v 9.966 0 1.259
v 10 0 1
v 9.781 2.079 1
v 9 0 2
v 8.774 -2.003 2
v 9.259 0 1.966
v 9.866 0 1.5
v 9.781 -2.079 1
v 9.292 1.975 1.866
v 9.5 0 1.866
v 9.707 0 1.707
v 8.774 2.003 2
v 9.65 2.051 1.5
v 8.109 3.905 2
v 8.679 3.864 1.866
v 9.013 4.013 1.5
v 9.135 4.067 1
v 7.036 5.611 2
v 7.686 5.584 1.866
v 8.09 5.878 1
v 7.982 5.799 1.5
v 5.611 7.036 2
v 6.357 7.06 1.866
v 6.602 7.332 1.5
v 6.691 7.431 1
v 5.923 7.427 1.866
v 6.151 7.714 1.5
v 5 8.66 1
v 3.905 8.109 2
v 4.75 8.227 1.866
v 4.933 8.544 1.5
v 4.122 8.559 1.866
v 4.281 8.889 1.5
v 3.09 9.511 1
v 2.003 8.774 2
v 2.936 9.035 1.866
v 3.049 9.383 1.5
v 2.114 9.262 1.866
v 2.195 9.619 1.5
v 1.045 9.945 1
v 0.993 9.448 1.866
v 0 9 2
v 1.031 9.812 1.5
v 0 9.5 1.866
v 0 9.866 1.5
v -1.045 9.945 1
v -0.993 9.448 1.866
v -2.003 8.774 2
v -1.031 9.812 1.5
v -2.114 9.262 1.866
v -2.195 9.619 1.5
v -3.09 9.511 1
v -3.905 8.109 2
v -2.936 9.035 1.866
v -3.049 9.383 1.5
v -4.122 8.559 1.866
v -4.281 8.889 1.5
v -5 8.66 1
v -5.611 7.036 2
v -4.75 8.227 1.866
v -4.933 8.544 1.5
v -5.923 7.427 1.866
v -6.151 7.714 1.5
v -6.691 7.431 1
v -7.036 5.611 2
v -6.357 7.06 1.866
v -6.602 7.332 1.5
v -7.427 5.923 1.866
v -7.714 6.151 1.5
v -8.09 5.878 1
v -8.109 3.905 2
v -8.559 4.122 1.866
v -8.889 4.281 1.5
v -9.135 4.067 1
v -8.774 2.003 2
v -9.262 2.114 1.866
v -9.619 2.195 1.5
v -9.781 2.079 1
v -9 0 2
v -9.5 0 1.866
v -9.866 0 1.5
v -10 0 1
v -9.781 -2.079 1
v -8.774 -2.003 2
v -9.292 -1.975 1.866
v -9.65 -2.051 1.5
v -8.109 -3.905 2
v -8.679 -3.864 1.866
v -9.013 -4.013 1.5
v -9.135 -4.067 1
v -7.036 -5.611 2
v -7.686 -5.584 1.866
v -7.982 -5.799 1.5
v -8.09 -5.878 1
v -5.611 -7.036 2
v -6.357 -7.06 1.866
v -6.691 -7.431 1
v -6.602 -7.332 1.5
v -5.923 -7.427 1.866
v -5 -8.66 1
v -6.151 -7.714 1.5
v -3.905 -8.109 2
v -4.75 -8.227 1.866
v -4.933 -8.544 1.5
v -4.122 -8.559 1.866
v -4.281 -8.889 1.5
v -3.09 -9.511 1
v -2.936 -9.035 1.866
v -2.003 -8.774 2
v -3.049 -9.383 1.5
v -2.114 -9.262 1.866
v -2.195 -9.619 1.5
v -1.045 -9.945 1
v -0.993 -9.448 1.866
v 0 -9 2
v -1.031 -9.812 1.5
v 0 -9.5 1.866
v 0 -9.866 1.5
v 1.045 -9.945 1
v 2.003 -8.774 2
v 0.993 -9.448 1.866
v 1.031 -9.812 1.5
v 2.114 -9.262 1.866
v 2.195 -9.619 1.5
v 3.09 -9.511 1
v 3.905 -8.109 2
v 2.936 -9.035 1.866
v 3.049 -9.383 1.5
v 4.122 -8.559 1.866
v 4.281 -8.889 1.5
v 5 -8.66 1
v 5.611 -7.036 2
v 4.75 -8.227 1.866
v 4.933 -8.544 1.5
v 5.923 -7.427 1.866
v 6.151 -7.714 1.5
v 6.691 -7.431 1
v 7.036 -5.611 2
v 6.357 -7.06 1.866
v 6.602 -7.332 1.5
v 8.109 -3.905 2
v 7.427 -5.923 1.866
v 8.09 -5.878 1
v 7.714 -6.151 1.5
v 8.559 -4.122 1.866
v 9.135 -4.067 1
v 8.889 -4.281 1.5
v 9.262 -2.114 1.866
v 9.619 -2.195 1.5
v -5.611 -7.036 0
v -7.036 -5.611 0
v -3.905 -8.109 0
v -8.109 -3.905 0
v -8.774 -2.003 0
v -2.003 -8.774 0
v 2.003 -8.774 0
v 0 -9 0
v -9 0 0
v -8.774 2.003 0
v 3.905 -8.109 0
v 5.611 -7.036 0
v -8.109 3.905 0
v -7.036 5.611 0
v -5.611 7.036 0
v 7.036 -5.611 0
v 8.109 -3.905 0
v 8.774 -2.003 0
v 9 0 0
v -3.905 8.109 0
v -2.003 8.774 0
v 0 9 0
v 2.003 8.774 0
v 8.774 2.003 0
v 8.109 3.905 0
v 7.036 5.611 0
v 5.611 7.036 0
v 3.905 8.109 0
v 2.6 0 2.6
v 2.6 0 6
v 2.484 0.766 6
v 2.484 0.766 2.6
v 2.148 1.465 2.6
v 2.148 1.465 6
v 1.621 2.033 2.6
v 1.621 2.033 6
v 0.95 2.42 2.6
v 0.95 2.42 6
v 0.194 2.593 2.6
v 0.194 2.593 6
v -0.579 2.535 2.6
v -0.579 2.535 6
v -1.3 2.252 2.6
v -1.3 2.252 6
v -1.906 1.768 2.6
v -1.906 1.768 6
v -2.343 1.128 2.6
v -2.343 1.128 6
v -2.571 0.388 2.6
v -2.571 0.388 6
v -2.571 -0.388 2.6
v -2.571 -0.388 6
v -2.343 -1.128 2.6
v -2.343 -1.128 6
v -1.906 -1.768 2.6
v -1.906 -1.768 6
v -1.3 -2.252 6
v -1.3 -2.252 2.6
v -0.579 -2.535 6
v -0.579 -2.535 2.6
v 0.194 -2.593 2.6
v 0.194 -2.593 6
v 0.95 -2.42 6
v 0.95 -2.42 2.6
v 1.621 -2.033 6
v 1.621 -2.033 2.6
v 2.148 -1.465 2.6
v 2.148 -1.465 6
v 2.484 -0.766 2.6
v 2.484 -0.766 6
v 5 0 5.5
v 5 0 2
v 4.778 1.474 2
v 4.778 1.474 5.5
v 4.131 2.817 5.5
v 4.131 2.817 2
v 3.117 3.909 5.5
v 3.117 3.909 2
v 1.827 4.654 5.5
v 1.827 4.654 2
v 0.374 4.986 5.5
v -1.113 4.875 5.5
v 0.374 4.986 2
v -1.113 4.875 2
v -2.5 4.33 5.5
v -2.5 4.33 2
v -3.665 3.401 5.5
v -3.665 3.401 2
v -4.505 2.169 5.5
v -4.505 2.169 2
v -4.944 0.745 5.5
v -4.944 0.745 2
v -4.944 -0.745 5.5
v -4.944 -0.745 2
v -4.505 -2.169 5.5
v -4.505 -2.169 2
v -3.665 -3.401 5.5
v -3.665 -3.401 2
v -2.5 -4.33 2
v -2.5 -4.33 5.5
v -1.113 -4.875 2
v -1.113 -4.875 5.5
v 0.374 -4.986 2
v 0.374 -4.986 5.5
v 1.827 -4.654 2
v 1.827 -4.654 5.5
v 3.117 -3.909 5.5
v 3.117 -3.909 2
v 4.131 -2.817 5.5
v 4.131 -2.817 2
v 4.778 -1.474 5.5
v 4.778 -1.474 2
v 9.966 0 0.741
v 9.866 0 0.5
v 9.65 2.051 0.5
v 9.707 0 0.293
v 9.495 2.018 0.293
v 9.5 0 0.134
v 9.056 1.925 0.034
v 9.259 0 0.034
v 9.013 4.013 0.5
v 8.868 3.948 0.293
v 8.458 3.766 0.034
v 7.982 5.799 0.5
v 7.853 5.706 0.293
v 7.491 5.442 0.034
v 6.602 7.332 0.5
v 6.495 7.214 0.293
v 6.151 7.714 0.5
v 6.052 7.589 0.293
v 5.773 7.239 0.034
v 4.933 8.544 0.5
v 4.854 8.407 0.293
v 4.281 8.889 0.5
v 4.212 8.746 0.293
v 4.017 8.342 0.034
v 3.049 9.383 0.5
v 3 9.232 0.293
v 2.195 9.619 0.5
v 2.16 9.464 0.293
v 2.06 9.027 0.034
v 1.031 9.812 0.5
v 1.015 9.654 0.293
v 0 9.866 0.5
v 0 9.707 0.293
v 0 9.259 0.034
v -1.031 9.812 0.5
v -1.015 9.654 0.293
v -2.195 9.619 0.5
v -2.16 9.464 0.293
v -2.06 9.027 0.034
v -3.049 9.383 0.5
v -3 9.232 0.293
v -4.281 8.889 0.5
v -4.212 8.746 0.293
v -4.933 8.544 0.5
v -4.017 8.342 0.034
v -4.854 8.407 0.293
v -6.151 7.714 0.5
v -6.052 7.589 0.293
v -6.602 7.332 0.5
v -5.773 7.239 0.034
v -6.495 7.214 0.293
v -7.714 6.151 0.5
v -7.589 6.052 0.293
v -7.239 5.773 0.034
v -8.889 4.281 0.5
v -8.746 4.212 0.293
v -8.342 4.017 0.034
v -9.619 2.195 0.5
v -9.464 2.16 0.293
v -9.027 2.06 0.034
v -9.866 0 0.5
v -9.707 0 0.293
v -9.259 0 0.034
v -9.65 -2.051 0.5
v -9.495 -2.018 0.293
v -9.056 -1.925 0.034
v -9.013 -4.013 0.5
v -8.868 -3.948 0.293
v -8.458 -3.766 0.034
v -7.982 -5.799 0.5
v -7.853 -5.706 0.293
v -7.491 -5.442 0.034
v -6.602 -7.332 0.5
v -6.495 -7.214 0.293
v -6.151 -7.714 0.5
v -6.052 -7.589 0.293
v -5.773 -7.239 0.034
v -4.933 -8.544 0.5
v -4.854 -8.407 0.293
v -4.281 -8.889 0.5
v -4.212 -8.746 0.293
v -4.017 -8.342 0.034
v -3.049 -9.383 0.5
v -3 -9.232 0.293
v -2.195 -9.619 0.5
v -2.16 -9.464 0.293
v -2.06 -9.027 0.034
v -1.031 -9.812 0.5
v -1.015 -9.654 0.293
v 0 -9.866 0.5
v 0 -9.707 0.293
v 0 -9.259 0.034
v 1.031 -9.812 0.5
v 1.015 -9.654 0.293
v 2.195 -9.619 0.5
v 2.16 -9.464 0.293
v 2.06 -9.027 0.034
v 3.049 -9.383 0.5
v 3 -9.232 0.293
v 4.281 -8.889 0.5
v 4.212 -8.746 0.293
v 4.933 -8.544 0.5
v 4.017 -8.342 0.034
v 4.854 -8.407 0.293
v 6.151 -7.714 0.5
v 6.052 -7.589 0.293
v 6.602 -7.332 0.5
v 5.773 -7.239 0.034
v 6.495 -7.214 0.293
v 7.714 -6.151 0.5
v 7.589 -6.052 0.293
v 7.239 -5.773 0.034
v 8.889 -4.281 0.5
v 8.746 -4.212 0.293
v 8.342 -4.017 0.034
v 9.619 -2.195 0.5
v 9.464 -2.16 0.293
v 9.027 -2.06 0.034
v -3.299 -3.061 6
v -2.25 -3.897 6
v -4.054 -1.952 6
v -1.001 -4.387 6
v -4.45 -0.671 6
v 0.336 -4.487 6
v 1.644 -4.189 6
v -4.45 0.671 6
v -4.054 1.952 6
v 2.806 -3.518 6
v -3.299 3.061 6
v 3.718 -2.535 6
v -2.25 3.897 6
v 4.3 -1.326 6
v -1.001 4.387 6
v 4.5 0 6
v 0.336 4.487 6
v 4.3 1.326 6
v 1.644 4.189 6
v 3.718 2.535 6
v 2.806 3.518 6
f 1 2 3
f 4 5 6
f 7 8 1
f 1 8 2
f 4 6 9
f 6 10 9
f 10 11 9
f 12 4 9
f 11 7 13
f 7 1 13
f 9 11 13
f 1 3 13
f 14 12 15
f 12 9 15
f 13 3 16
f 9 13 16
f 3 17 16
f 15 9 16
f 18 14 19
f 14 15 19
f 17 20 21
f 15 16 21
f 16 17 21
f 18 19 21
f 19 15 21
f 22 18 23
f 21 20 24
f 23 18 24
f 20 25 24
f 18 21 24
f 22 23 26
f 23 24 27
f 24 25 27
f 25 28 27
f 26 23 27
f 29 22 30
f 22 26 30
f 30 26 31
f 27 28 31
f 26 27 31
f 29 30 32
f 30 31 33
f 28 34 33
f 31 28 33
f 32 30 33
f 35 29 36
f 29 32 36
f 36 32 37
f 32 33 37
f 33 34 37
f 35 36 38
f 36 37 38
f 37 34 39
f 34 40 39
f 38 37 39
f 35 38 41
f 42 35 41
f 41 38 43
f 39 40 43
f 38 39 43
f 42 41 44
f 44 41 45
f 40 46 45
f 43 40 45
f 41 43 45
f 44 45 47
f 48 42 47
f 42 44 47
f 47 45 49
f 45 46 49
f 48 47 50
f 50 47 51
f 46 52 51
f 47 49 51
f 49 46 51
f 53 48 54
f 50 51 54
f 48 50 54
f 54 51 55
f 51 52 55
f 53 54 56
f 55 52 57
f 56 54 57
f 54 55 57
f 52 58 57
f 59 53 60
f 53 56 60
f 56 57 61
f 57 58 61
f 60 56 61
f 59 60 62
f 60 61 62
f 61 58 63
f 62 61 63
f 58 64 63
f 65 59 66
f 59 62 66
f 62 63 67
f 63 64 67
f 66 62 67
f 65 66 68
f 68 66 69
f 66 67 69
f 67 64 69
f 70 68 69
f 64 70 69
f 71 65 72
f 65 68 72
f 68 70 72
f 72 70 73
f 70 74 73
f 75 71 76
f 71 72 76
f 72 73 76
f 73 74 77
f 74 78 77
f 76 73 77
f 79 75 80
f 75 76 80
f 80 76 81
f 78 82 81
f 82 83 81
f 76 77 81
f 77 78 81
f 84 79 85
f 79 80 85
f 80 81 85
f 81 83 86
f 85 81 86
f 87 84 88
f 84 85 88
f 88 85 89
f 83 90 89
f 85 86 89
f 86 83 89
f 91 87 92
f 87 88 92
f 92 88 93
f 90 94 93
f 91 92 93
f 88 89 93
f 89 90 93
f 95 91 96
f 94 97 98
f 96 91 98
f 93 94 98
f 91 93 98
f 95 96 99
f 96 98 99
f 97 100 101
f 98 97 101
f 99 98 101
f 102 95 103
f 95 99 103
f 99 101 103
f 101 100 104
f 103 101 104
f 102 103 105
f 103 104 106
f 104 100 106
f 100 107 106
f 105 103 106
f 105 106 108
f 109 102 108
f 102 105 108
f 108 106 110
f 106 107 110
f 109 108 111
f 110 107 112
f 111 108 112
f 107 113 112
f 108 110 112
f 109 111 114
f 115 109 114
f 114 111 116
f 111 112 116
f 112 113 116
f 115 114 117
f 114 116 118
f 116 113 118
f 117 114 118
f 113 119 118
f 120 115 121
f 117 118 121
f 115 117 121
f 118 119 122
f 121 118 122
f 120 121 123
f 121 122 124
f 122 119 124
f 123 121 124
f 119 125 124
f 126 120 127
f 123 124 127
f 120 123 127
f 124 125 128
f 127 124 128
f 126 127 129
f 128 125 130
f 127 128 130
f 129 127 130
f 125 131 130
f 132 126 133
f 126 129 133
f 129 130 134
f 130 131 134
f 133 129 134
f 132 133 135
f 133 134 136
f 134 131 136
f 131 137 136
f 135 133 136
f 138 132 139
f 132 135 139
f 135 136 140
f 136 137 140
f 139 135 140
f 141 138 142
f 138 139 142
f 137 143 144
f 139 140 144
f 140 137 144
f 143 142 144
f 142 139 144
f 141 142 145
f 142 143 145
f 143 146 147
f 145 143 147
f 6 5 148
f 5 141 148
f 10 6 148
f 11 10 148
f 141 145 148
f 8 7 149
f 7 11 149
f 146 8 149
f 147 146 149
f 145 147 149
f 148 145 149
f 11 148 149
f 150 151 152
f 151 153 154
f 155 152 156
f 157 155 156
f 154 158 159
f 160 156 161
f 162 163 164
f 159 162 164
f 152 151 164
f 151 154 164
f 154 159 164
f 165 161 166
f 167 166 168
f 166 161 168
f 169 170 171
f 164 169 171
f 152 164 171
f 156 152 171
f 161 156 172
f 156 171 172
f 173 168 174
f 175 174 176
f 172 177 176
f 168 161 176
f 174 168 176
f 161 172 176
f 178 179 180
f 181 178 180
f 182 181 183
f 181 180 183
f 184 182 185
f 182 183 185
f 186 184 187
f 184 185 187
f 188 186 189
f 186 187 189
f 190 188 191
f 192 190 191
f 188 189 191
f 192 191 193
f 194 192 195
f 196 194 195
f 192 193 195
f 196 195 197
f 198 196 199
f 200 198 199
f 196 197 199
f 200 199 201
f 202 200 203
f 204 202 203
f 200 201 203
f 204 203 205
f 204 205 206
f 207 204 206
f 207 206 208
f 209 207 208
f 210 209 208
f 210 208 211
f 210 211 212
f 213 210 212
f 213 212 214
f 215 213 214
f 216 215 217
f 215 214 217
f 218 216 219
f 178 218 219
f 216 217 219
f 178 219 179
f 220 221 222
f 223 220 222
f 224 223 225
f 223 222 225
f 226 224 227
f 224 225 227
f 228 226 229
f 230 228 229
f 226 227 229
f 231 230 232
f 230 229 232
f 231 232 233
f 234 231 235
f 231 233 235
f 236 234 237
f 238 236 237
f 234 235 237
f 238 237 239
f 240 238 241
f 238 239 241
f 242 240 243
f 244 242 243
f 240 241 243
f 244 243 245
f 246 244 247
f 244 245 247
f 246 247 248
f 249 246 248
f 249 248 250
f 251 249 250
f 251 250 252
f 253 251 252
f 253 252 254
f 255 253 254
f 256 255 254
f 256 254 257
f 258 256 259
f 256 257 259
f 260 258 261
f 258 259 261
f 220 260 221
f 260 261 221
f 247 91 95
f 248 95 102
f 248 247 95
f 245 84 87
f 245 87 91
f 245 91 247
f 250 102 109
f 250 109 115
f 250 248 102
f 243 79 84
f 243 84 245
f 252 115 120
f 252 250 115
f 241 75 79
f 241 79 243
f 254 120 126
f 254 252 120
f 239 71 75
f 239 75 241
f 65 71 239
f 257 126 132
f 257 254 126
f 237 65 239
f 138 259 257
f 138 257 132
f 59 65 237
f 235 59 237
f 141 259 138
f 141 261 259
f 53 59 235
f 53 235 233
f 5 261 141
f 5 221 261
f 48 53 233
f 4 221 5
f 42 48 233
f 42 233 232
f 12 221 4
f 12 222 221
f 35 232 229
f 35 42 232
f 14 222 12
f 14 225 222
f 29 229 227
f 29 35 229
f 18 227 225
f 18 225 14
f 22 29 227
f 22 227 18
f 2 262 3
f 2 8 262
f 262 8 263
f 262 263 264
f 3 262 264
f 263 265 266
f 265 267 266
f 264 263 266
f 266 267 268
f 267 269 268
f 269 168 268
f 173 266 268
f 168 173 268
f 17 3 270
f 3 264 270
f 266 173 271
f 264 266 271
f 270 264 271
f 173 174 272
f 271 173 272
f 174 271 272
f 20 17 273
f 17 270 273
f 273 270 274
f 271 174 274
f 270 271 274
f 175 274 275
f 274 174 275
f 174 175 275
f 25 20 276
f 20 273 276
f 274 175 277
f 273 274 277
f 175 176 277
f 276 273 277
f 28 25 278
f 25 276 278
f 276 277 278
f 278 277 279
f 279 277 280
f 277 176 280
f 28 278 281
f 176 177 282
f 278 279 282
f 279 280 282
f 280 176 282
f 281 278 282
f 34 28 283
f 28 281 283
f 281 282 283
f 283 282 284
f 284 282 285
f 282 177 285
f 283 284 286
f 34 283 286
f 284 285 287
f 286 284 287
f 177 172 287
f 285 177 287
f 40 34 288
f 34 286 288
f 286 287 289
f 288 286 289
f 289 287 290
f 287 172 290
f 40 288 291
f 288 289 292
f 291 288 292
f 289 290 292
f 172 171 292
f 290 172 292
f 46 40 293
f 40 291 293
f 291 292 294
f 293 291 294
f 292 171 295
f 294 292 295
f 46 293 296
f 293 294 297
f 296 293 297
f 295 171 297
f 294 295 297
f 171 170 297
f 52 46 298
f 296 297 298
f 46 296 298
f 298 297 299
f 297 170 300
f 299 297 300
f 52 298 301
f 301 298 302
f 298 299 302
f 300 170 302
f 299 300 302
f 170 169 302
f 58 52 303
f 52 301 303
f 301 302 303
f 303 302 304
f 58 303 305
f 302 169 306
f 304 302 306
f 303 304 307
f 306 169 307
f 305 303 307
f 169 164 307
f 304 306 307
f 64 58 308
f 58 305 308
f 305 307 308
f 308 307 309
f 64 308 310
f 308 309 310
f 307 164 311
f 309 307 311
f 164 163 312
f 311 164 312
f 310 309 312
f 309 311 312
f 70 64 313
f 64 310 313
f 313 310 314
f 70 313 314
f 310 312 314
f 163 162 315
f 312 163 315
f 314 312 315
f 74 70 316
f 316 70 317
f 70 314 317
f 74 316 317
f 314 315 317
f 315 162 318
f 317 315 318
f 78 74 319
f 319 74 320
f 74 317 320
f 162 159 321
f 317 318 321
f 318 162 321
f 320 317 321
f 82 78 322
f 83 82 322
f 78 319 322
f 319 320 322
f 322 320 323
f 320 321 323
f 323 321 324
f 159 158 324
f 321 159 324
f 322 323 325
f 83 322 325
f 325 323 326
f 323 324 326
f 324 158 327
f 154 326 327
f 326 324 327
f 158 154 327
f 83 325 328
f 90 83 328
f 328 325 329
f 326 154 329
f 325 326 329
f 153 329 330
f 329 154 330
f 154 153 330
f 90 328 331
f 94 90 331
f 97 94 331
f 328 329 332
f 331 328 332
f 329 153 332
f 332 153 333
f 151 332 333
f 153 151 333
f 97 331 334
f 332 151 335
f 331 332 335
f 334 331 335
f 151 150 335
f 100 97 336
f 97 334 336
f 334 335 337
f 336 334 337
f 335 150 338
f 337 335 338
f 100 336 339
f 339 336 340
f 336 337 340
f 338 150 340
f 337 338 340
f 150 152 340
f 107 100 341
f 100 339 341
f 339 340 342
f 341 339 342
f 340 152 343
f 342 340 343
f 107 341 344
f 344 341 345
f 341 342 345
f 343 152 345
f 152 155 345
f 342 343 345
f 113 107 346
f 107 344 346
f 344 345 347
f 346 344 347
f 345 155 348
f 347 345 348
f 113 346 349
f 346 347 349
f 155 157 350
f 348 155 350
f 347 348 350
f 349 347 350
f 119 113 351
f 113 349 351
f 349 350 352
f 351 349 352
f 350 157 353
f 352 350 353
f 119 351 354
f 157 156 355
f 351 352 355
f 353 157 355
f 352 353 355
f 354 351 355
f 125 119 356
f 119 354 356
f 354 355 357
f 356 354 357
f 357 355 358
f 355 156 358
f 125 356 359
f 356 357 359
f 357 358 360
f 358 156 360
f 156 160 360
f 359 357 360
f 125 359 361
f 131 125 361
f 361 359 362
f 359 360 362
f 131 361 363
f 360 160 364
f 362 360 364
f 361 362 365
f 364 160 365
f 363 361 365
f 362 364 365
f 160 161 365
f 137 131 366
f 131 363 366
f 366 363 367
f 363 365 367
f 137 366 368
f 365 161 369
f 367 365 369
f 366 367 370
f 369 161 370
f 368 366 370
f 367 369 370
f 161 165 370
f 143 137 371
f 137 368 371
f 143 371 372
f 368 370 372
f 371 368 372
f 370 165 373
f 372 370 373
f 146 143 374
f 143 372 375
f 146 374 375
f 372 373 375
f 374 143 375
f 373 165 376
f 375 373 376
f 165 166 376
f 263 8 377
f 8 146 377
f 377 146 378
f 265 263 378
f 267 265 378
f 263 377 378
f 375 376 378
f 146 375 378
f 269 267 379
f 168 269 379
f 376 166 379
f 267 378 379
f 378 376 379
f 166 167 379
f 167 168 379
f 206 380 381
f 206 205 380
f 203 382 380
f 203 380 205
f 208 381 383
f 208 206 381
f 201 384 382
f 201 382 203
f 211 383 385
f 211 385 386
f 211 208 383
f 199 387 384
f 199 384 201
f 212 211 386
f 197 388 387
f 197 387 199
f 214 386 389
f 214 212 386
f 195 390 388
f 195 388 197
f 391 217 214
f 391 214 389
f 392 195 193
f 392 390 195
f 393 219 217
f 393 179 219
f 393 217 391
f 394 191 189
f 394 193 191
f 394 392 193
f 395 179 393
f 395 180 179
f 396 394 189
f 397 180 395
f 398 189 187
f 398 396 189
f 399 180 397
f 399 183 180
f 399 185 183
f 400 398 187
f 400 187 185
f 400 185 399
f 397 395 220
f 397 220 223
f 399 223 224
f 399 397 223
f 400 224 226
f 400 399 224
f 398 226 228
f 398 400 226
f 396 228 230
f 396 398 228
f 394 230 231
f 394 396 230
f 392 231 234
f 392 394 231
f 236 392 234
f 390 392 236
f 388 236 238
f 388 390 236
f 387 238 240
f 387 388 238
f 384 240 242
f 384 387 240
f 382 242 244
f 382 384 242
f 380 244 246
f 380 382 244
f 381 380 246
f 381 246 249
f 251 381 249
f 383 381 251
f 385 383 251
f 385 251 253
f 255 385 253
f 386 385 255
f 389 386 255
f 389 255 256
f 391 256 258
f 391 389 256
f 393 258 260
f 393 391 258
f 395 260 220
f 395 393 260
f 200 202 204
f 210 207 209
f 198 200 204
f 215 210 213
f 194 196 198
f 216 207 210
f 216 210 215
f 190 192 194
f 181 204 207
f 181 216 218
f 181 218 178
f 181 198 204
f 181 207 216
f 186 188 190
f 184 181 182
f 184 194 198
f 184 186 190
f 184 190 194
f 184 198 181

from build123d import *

# Parameters (mm, degrees)
F0_R     = 10
F1_DEPTH = 2
F2_R     = 5
F3_DEPTH = 4
F4_SIZE  = 0.5
F5_R     = 0.99999
F6_R     = 2.6
F7_DEPTH = 3.4


# Not quite as in the source:
# - a fillet or chamfer is up to 0.001 mm smaller than in the source, because OpenCascade refuses the exact size


with BuildPart() as f1:
    # F0 (on Top) → F1 (new body)
    with BuildSketch(Plane.XY):
        Circle(F0_R)
    extrude(amount=F1_DEPTH)

    # F2 (on face) → F3 (join)
    with BuildSketch(Plane.XY.offset(2)):
        Circle(F2_R)
    extrude(amount=F3_DEPTH)

    # F4
    f4_edges = [f1.edges().sort_by_distance(p)[0] for p in [
        (-5, 0, 6),
    ]]
    chamfer(f4_edges, length=F4_SIZE)

    # F5 (radius 1 in the source; OpenCascade refuses exactly that, so slightly less here)
    f5_edges = [f1.edges().sort_by_distance(p)[0] for p in [
        (-10, 0, 0),
        (-10, 0, 2),
    ]]
    fillet(f5_edges, radius=F5_R)

    # F6 (on face) → F7 (cut)
    with BuildSketch(Plane.XY.offset(6)):
        Circle(F6_R)
    extrude(amount=-F7_DEPTH, mode=Mode.SUBTRACT)


solid = f1.part
